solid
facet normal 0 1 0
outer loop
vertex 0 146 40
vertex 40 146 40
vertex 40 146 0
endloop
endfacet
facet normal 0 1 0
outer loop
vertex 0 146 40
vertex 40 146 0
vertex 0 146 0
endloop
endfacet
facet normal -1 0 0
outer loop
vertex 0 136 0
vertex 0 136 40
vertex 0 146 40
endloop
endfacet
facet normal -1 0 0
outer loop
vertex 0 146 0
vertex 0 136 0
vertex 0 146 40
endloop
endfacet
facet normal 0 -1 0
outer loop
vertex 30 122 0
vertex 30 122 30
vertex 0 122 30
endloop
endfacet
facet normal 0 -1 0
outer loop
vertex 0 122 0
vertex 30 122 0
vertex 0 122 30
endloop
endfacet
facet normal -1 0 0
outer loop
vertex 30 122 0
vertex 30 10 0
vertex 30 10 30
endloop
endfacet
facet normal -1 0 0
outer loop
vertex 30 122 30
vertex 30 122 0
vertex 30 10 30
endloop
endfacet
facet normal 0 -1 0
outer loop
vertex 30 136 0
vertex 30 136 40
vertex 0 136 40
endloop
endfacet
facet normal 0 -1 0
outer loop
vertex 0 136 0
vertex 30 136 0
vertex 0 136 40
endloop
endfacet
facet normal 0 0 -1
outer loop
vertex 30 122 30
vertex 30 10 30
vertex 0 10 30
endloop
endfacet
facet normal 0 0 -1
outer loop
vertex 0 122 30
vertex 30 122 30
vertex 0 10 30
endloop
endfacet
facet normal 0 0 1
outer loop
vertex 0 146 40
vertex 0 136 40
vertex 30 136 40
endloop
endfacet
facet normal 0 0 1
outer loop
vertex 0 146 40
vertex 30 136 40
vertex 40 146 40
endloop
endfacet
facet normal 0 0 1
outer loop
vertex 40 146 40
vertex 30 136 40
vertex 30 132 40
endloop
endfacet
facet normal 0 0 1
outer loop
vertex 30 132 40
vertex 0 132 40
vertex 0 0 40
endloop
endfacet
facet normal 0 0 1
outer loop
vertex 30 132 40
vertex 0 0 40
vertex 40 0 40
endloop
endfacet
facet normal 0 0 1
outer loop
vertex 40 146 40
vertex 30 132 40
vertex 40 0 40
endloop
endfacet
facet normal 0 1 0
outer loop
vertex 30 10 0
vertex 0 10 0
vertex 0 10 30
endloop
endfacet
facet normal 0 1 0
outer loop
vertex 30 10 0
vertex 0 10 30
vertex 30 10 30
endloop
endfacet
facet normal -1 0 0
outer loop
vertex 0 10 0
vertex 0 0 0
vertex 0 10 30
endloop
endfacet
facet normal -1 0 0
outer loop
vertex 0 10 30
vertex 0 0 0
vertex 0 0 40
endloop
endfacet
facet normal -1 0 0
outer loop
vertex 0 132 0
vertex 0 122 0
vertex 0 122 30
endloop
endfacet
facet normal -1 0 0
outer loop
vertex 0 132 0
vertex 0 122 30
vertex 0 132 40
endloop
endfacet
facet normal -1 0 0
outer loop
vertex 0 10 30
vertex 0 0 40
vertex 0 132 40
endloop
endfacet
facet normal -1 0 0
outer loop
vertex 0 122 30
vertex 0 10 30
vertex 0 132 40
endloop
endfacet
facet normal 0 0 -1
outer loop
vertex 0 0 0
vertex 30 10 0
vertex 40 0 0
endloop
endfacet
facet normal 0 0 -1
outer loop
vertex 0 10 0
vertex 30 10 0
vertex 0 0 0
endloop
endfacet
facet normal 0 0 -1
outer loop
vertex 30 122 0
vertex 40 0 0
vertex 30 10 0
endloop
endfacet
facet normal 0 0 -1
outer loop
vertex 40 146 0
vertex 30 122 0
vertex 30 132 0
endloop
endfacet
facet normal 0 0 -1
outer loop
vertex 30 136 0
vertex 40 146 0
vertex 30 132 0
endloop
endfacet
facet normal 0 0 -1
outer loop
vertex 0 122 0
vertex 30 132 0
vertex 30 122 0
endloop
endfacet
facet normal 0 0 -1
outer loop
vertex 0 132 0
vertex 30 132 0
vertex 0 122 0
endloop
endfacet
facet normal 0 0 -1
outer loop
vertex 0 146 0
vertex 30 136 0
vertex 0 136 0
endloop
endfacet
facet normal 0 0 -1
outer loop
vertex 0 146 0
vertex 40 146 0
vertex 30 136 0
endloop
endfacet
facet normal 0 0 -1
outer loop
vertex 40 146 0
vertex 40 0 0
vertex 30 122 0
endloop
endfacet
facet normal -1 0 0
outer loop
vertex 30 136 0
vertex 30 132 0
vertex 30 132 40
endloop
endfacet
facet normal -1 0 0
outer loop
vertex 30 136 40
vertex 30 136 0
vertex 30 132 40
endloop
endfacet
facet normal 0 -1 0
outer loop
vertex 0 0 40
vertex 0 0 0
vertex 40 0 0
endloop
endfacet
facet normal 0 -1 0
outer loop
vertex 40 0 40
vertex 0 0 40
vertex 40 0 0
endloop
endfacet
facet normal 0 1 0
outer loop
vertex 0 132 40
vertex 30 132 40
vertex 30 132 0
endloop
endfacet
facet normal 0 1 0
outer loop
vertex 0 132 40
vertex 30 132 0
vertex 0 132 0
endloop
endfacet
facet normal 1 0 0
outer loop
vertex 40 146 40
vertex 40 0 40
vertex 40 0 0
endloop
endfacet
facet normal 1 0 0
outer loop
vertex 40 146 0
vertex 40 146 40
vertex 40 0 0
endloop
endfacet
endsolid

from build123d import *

# Parameters (mm, degrees)
ESBO_O1_W                = 40
ESBO_O1_H                = 40
RESSALTO_EXTRUS_O1_DEPTH = 10
RESSALTO_EXTRUS_O2_DEPTH = 136
ESBO_O3_W                = 30
ESBO_O3_H                = 10
RESSALTO_EXTRUS_O3_DEPTH = 30
ESBO_O4_W                = 30
ESBO_O4_H                = 4
CORTE_EXTRUS_O1_DEPTH    = 11


with BuildPart() as part:
    # Esboço1 → Ressalto-extrusão1 (new body)
    with BuildSketch(Plane(origin=(0, 0, 0), x_dir=(1, 0, 0), z_dir=(0, 1, 0))):
        with Locations((20, -20)):
            Rectangle(ESBO_O1_W, ESBO_O1_H)
    extrude(amount=RESSALTO_EXTRUS_O1_DEPTH)

    # Esboço2 → Ressalto-extrusão2 (add)
    with BuildSketch(Plane(origin=(0, 10, 0), x_dir=(1, 0, 0), z_dir=(0, 1, 0))):
        Polygon((40, 0), (30, 0), (30, -30), (0, -30), (0, -40), (40, -40), align=None)
    extrude(amount=RESSALTO_EXTRUS_O2_DEPTH)

    # Esboço3 → Ressalto-extrusão3 (add)
    with BuildSketch(Plane(origin=(0, 0, 30), x_dir=(-1, 0, 0), z_dir=(0, 0, -1))):
        with Locations((-15, 141)):
            Rectangle(ESBO_O3_W, ESBO_O3_H)
        with Locations((-15, 127)):
            Rectangle(ESBO_O3_W, ESBO_O3_H)
    extrude(amount=RESSALTO_EXTRUS_O3_DEPTH)

    # Esboço4 → Corte-extrusão1 (cut, through all)
    with BuildSketch(Plane(origin=(0, 0, 30), x_dir=(-1, 0, 0), z_dir=(0, 0, -1))):
        with Locations((-15, 134)):
            Rectangle(ESBO_O4_W, ESBO_O4_H)
    extrude(amount=-CORTE_EXTRUS_O1_DEPTH, mode=Mode.SUBTRACT)


solid = part.part
